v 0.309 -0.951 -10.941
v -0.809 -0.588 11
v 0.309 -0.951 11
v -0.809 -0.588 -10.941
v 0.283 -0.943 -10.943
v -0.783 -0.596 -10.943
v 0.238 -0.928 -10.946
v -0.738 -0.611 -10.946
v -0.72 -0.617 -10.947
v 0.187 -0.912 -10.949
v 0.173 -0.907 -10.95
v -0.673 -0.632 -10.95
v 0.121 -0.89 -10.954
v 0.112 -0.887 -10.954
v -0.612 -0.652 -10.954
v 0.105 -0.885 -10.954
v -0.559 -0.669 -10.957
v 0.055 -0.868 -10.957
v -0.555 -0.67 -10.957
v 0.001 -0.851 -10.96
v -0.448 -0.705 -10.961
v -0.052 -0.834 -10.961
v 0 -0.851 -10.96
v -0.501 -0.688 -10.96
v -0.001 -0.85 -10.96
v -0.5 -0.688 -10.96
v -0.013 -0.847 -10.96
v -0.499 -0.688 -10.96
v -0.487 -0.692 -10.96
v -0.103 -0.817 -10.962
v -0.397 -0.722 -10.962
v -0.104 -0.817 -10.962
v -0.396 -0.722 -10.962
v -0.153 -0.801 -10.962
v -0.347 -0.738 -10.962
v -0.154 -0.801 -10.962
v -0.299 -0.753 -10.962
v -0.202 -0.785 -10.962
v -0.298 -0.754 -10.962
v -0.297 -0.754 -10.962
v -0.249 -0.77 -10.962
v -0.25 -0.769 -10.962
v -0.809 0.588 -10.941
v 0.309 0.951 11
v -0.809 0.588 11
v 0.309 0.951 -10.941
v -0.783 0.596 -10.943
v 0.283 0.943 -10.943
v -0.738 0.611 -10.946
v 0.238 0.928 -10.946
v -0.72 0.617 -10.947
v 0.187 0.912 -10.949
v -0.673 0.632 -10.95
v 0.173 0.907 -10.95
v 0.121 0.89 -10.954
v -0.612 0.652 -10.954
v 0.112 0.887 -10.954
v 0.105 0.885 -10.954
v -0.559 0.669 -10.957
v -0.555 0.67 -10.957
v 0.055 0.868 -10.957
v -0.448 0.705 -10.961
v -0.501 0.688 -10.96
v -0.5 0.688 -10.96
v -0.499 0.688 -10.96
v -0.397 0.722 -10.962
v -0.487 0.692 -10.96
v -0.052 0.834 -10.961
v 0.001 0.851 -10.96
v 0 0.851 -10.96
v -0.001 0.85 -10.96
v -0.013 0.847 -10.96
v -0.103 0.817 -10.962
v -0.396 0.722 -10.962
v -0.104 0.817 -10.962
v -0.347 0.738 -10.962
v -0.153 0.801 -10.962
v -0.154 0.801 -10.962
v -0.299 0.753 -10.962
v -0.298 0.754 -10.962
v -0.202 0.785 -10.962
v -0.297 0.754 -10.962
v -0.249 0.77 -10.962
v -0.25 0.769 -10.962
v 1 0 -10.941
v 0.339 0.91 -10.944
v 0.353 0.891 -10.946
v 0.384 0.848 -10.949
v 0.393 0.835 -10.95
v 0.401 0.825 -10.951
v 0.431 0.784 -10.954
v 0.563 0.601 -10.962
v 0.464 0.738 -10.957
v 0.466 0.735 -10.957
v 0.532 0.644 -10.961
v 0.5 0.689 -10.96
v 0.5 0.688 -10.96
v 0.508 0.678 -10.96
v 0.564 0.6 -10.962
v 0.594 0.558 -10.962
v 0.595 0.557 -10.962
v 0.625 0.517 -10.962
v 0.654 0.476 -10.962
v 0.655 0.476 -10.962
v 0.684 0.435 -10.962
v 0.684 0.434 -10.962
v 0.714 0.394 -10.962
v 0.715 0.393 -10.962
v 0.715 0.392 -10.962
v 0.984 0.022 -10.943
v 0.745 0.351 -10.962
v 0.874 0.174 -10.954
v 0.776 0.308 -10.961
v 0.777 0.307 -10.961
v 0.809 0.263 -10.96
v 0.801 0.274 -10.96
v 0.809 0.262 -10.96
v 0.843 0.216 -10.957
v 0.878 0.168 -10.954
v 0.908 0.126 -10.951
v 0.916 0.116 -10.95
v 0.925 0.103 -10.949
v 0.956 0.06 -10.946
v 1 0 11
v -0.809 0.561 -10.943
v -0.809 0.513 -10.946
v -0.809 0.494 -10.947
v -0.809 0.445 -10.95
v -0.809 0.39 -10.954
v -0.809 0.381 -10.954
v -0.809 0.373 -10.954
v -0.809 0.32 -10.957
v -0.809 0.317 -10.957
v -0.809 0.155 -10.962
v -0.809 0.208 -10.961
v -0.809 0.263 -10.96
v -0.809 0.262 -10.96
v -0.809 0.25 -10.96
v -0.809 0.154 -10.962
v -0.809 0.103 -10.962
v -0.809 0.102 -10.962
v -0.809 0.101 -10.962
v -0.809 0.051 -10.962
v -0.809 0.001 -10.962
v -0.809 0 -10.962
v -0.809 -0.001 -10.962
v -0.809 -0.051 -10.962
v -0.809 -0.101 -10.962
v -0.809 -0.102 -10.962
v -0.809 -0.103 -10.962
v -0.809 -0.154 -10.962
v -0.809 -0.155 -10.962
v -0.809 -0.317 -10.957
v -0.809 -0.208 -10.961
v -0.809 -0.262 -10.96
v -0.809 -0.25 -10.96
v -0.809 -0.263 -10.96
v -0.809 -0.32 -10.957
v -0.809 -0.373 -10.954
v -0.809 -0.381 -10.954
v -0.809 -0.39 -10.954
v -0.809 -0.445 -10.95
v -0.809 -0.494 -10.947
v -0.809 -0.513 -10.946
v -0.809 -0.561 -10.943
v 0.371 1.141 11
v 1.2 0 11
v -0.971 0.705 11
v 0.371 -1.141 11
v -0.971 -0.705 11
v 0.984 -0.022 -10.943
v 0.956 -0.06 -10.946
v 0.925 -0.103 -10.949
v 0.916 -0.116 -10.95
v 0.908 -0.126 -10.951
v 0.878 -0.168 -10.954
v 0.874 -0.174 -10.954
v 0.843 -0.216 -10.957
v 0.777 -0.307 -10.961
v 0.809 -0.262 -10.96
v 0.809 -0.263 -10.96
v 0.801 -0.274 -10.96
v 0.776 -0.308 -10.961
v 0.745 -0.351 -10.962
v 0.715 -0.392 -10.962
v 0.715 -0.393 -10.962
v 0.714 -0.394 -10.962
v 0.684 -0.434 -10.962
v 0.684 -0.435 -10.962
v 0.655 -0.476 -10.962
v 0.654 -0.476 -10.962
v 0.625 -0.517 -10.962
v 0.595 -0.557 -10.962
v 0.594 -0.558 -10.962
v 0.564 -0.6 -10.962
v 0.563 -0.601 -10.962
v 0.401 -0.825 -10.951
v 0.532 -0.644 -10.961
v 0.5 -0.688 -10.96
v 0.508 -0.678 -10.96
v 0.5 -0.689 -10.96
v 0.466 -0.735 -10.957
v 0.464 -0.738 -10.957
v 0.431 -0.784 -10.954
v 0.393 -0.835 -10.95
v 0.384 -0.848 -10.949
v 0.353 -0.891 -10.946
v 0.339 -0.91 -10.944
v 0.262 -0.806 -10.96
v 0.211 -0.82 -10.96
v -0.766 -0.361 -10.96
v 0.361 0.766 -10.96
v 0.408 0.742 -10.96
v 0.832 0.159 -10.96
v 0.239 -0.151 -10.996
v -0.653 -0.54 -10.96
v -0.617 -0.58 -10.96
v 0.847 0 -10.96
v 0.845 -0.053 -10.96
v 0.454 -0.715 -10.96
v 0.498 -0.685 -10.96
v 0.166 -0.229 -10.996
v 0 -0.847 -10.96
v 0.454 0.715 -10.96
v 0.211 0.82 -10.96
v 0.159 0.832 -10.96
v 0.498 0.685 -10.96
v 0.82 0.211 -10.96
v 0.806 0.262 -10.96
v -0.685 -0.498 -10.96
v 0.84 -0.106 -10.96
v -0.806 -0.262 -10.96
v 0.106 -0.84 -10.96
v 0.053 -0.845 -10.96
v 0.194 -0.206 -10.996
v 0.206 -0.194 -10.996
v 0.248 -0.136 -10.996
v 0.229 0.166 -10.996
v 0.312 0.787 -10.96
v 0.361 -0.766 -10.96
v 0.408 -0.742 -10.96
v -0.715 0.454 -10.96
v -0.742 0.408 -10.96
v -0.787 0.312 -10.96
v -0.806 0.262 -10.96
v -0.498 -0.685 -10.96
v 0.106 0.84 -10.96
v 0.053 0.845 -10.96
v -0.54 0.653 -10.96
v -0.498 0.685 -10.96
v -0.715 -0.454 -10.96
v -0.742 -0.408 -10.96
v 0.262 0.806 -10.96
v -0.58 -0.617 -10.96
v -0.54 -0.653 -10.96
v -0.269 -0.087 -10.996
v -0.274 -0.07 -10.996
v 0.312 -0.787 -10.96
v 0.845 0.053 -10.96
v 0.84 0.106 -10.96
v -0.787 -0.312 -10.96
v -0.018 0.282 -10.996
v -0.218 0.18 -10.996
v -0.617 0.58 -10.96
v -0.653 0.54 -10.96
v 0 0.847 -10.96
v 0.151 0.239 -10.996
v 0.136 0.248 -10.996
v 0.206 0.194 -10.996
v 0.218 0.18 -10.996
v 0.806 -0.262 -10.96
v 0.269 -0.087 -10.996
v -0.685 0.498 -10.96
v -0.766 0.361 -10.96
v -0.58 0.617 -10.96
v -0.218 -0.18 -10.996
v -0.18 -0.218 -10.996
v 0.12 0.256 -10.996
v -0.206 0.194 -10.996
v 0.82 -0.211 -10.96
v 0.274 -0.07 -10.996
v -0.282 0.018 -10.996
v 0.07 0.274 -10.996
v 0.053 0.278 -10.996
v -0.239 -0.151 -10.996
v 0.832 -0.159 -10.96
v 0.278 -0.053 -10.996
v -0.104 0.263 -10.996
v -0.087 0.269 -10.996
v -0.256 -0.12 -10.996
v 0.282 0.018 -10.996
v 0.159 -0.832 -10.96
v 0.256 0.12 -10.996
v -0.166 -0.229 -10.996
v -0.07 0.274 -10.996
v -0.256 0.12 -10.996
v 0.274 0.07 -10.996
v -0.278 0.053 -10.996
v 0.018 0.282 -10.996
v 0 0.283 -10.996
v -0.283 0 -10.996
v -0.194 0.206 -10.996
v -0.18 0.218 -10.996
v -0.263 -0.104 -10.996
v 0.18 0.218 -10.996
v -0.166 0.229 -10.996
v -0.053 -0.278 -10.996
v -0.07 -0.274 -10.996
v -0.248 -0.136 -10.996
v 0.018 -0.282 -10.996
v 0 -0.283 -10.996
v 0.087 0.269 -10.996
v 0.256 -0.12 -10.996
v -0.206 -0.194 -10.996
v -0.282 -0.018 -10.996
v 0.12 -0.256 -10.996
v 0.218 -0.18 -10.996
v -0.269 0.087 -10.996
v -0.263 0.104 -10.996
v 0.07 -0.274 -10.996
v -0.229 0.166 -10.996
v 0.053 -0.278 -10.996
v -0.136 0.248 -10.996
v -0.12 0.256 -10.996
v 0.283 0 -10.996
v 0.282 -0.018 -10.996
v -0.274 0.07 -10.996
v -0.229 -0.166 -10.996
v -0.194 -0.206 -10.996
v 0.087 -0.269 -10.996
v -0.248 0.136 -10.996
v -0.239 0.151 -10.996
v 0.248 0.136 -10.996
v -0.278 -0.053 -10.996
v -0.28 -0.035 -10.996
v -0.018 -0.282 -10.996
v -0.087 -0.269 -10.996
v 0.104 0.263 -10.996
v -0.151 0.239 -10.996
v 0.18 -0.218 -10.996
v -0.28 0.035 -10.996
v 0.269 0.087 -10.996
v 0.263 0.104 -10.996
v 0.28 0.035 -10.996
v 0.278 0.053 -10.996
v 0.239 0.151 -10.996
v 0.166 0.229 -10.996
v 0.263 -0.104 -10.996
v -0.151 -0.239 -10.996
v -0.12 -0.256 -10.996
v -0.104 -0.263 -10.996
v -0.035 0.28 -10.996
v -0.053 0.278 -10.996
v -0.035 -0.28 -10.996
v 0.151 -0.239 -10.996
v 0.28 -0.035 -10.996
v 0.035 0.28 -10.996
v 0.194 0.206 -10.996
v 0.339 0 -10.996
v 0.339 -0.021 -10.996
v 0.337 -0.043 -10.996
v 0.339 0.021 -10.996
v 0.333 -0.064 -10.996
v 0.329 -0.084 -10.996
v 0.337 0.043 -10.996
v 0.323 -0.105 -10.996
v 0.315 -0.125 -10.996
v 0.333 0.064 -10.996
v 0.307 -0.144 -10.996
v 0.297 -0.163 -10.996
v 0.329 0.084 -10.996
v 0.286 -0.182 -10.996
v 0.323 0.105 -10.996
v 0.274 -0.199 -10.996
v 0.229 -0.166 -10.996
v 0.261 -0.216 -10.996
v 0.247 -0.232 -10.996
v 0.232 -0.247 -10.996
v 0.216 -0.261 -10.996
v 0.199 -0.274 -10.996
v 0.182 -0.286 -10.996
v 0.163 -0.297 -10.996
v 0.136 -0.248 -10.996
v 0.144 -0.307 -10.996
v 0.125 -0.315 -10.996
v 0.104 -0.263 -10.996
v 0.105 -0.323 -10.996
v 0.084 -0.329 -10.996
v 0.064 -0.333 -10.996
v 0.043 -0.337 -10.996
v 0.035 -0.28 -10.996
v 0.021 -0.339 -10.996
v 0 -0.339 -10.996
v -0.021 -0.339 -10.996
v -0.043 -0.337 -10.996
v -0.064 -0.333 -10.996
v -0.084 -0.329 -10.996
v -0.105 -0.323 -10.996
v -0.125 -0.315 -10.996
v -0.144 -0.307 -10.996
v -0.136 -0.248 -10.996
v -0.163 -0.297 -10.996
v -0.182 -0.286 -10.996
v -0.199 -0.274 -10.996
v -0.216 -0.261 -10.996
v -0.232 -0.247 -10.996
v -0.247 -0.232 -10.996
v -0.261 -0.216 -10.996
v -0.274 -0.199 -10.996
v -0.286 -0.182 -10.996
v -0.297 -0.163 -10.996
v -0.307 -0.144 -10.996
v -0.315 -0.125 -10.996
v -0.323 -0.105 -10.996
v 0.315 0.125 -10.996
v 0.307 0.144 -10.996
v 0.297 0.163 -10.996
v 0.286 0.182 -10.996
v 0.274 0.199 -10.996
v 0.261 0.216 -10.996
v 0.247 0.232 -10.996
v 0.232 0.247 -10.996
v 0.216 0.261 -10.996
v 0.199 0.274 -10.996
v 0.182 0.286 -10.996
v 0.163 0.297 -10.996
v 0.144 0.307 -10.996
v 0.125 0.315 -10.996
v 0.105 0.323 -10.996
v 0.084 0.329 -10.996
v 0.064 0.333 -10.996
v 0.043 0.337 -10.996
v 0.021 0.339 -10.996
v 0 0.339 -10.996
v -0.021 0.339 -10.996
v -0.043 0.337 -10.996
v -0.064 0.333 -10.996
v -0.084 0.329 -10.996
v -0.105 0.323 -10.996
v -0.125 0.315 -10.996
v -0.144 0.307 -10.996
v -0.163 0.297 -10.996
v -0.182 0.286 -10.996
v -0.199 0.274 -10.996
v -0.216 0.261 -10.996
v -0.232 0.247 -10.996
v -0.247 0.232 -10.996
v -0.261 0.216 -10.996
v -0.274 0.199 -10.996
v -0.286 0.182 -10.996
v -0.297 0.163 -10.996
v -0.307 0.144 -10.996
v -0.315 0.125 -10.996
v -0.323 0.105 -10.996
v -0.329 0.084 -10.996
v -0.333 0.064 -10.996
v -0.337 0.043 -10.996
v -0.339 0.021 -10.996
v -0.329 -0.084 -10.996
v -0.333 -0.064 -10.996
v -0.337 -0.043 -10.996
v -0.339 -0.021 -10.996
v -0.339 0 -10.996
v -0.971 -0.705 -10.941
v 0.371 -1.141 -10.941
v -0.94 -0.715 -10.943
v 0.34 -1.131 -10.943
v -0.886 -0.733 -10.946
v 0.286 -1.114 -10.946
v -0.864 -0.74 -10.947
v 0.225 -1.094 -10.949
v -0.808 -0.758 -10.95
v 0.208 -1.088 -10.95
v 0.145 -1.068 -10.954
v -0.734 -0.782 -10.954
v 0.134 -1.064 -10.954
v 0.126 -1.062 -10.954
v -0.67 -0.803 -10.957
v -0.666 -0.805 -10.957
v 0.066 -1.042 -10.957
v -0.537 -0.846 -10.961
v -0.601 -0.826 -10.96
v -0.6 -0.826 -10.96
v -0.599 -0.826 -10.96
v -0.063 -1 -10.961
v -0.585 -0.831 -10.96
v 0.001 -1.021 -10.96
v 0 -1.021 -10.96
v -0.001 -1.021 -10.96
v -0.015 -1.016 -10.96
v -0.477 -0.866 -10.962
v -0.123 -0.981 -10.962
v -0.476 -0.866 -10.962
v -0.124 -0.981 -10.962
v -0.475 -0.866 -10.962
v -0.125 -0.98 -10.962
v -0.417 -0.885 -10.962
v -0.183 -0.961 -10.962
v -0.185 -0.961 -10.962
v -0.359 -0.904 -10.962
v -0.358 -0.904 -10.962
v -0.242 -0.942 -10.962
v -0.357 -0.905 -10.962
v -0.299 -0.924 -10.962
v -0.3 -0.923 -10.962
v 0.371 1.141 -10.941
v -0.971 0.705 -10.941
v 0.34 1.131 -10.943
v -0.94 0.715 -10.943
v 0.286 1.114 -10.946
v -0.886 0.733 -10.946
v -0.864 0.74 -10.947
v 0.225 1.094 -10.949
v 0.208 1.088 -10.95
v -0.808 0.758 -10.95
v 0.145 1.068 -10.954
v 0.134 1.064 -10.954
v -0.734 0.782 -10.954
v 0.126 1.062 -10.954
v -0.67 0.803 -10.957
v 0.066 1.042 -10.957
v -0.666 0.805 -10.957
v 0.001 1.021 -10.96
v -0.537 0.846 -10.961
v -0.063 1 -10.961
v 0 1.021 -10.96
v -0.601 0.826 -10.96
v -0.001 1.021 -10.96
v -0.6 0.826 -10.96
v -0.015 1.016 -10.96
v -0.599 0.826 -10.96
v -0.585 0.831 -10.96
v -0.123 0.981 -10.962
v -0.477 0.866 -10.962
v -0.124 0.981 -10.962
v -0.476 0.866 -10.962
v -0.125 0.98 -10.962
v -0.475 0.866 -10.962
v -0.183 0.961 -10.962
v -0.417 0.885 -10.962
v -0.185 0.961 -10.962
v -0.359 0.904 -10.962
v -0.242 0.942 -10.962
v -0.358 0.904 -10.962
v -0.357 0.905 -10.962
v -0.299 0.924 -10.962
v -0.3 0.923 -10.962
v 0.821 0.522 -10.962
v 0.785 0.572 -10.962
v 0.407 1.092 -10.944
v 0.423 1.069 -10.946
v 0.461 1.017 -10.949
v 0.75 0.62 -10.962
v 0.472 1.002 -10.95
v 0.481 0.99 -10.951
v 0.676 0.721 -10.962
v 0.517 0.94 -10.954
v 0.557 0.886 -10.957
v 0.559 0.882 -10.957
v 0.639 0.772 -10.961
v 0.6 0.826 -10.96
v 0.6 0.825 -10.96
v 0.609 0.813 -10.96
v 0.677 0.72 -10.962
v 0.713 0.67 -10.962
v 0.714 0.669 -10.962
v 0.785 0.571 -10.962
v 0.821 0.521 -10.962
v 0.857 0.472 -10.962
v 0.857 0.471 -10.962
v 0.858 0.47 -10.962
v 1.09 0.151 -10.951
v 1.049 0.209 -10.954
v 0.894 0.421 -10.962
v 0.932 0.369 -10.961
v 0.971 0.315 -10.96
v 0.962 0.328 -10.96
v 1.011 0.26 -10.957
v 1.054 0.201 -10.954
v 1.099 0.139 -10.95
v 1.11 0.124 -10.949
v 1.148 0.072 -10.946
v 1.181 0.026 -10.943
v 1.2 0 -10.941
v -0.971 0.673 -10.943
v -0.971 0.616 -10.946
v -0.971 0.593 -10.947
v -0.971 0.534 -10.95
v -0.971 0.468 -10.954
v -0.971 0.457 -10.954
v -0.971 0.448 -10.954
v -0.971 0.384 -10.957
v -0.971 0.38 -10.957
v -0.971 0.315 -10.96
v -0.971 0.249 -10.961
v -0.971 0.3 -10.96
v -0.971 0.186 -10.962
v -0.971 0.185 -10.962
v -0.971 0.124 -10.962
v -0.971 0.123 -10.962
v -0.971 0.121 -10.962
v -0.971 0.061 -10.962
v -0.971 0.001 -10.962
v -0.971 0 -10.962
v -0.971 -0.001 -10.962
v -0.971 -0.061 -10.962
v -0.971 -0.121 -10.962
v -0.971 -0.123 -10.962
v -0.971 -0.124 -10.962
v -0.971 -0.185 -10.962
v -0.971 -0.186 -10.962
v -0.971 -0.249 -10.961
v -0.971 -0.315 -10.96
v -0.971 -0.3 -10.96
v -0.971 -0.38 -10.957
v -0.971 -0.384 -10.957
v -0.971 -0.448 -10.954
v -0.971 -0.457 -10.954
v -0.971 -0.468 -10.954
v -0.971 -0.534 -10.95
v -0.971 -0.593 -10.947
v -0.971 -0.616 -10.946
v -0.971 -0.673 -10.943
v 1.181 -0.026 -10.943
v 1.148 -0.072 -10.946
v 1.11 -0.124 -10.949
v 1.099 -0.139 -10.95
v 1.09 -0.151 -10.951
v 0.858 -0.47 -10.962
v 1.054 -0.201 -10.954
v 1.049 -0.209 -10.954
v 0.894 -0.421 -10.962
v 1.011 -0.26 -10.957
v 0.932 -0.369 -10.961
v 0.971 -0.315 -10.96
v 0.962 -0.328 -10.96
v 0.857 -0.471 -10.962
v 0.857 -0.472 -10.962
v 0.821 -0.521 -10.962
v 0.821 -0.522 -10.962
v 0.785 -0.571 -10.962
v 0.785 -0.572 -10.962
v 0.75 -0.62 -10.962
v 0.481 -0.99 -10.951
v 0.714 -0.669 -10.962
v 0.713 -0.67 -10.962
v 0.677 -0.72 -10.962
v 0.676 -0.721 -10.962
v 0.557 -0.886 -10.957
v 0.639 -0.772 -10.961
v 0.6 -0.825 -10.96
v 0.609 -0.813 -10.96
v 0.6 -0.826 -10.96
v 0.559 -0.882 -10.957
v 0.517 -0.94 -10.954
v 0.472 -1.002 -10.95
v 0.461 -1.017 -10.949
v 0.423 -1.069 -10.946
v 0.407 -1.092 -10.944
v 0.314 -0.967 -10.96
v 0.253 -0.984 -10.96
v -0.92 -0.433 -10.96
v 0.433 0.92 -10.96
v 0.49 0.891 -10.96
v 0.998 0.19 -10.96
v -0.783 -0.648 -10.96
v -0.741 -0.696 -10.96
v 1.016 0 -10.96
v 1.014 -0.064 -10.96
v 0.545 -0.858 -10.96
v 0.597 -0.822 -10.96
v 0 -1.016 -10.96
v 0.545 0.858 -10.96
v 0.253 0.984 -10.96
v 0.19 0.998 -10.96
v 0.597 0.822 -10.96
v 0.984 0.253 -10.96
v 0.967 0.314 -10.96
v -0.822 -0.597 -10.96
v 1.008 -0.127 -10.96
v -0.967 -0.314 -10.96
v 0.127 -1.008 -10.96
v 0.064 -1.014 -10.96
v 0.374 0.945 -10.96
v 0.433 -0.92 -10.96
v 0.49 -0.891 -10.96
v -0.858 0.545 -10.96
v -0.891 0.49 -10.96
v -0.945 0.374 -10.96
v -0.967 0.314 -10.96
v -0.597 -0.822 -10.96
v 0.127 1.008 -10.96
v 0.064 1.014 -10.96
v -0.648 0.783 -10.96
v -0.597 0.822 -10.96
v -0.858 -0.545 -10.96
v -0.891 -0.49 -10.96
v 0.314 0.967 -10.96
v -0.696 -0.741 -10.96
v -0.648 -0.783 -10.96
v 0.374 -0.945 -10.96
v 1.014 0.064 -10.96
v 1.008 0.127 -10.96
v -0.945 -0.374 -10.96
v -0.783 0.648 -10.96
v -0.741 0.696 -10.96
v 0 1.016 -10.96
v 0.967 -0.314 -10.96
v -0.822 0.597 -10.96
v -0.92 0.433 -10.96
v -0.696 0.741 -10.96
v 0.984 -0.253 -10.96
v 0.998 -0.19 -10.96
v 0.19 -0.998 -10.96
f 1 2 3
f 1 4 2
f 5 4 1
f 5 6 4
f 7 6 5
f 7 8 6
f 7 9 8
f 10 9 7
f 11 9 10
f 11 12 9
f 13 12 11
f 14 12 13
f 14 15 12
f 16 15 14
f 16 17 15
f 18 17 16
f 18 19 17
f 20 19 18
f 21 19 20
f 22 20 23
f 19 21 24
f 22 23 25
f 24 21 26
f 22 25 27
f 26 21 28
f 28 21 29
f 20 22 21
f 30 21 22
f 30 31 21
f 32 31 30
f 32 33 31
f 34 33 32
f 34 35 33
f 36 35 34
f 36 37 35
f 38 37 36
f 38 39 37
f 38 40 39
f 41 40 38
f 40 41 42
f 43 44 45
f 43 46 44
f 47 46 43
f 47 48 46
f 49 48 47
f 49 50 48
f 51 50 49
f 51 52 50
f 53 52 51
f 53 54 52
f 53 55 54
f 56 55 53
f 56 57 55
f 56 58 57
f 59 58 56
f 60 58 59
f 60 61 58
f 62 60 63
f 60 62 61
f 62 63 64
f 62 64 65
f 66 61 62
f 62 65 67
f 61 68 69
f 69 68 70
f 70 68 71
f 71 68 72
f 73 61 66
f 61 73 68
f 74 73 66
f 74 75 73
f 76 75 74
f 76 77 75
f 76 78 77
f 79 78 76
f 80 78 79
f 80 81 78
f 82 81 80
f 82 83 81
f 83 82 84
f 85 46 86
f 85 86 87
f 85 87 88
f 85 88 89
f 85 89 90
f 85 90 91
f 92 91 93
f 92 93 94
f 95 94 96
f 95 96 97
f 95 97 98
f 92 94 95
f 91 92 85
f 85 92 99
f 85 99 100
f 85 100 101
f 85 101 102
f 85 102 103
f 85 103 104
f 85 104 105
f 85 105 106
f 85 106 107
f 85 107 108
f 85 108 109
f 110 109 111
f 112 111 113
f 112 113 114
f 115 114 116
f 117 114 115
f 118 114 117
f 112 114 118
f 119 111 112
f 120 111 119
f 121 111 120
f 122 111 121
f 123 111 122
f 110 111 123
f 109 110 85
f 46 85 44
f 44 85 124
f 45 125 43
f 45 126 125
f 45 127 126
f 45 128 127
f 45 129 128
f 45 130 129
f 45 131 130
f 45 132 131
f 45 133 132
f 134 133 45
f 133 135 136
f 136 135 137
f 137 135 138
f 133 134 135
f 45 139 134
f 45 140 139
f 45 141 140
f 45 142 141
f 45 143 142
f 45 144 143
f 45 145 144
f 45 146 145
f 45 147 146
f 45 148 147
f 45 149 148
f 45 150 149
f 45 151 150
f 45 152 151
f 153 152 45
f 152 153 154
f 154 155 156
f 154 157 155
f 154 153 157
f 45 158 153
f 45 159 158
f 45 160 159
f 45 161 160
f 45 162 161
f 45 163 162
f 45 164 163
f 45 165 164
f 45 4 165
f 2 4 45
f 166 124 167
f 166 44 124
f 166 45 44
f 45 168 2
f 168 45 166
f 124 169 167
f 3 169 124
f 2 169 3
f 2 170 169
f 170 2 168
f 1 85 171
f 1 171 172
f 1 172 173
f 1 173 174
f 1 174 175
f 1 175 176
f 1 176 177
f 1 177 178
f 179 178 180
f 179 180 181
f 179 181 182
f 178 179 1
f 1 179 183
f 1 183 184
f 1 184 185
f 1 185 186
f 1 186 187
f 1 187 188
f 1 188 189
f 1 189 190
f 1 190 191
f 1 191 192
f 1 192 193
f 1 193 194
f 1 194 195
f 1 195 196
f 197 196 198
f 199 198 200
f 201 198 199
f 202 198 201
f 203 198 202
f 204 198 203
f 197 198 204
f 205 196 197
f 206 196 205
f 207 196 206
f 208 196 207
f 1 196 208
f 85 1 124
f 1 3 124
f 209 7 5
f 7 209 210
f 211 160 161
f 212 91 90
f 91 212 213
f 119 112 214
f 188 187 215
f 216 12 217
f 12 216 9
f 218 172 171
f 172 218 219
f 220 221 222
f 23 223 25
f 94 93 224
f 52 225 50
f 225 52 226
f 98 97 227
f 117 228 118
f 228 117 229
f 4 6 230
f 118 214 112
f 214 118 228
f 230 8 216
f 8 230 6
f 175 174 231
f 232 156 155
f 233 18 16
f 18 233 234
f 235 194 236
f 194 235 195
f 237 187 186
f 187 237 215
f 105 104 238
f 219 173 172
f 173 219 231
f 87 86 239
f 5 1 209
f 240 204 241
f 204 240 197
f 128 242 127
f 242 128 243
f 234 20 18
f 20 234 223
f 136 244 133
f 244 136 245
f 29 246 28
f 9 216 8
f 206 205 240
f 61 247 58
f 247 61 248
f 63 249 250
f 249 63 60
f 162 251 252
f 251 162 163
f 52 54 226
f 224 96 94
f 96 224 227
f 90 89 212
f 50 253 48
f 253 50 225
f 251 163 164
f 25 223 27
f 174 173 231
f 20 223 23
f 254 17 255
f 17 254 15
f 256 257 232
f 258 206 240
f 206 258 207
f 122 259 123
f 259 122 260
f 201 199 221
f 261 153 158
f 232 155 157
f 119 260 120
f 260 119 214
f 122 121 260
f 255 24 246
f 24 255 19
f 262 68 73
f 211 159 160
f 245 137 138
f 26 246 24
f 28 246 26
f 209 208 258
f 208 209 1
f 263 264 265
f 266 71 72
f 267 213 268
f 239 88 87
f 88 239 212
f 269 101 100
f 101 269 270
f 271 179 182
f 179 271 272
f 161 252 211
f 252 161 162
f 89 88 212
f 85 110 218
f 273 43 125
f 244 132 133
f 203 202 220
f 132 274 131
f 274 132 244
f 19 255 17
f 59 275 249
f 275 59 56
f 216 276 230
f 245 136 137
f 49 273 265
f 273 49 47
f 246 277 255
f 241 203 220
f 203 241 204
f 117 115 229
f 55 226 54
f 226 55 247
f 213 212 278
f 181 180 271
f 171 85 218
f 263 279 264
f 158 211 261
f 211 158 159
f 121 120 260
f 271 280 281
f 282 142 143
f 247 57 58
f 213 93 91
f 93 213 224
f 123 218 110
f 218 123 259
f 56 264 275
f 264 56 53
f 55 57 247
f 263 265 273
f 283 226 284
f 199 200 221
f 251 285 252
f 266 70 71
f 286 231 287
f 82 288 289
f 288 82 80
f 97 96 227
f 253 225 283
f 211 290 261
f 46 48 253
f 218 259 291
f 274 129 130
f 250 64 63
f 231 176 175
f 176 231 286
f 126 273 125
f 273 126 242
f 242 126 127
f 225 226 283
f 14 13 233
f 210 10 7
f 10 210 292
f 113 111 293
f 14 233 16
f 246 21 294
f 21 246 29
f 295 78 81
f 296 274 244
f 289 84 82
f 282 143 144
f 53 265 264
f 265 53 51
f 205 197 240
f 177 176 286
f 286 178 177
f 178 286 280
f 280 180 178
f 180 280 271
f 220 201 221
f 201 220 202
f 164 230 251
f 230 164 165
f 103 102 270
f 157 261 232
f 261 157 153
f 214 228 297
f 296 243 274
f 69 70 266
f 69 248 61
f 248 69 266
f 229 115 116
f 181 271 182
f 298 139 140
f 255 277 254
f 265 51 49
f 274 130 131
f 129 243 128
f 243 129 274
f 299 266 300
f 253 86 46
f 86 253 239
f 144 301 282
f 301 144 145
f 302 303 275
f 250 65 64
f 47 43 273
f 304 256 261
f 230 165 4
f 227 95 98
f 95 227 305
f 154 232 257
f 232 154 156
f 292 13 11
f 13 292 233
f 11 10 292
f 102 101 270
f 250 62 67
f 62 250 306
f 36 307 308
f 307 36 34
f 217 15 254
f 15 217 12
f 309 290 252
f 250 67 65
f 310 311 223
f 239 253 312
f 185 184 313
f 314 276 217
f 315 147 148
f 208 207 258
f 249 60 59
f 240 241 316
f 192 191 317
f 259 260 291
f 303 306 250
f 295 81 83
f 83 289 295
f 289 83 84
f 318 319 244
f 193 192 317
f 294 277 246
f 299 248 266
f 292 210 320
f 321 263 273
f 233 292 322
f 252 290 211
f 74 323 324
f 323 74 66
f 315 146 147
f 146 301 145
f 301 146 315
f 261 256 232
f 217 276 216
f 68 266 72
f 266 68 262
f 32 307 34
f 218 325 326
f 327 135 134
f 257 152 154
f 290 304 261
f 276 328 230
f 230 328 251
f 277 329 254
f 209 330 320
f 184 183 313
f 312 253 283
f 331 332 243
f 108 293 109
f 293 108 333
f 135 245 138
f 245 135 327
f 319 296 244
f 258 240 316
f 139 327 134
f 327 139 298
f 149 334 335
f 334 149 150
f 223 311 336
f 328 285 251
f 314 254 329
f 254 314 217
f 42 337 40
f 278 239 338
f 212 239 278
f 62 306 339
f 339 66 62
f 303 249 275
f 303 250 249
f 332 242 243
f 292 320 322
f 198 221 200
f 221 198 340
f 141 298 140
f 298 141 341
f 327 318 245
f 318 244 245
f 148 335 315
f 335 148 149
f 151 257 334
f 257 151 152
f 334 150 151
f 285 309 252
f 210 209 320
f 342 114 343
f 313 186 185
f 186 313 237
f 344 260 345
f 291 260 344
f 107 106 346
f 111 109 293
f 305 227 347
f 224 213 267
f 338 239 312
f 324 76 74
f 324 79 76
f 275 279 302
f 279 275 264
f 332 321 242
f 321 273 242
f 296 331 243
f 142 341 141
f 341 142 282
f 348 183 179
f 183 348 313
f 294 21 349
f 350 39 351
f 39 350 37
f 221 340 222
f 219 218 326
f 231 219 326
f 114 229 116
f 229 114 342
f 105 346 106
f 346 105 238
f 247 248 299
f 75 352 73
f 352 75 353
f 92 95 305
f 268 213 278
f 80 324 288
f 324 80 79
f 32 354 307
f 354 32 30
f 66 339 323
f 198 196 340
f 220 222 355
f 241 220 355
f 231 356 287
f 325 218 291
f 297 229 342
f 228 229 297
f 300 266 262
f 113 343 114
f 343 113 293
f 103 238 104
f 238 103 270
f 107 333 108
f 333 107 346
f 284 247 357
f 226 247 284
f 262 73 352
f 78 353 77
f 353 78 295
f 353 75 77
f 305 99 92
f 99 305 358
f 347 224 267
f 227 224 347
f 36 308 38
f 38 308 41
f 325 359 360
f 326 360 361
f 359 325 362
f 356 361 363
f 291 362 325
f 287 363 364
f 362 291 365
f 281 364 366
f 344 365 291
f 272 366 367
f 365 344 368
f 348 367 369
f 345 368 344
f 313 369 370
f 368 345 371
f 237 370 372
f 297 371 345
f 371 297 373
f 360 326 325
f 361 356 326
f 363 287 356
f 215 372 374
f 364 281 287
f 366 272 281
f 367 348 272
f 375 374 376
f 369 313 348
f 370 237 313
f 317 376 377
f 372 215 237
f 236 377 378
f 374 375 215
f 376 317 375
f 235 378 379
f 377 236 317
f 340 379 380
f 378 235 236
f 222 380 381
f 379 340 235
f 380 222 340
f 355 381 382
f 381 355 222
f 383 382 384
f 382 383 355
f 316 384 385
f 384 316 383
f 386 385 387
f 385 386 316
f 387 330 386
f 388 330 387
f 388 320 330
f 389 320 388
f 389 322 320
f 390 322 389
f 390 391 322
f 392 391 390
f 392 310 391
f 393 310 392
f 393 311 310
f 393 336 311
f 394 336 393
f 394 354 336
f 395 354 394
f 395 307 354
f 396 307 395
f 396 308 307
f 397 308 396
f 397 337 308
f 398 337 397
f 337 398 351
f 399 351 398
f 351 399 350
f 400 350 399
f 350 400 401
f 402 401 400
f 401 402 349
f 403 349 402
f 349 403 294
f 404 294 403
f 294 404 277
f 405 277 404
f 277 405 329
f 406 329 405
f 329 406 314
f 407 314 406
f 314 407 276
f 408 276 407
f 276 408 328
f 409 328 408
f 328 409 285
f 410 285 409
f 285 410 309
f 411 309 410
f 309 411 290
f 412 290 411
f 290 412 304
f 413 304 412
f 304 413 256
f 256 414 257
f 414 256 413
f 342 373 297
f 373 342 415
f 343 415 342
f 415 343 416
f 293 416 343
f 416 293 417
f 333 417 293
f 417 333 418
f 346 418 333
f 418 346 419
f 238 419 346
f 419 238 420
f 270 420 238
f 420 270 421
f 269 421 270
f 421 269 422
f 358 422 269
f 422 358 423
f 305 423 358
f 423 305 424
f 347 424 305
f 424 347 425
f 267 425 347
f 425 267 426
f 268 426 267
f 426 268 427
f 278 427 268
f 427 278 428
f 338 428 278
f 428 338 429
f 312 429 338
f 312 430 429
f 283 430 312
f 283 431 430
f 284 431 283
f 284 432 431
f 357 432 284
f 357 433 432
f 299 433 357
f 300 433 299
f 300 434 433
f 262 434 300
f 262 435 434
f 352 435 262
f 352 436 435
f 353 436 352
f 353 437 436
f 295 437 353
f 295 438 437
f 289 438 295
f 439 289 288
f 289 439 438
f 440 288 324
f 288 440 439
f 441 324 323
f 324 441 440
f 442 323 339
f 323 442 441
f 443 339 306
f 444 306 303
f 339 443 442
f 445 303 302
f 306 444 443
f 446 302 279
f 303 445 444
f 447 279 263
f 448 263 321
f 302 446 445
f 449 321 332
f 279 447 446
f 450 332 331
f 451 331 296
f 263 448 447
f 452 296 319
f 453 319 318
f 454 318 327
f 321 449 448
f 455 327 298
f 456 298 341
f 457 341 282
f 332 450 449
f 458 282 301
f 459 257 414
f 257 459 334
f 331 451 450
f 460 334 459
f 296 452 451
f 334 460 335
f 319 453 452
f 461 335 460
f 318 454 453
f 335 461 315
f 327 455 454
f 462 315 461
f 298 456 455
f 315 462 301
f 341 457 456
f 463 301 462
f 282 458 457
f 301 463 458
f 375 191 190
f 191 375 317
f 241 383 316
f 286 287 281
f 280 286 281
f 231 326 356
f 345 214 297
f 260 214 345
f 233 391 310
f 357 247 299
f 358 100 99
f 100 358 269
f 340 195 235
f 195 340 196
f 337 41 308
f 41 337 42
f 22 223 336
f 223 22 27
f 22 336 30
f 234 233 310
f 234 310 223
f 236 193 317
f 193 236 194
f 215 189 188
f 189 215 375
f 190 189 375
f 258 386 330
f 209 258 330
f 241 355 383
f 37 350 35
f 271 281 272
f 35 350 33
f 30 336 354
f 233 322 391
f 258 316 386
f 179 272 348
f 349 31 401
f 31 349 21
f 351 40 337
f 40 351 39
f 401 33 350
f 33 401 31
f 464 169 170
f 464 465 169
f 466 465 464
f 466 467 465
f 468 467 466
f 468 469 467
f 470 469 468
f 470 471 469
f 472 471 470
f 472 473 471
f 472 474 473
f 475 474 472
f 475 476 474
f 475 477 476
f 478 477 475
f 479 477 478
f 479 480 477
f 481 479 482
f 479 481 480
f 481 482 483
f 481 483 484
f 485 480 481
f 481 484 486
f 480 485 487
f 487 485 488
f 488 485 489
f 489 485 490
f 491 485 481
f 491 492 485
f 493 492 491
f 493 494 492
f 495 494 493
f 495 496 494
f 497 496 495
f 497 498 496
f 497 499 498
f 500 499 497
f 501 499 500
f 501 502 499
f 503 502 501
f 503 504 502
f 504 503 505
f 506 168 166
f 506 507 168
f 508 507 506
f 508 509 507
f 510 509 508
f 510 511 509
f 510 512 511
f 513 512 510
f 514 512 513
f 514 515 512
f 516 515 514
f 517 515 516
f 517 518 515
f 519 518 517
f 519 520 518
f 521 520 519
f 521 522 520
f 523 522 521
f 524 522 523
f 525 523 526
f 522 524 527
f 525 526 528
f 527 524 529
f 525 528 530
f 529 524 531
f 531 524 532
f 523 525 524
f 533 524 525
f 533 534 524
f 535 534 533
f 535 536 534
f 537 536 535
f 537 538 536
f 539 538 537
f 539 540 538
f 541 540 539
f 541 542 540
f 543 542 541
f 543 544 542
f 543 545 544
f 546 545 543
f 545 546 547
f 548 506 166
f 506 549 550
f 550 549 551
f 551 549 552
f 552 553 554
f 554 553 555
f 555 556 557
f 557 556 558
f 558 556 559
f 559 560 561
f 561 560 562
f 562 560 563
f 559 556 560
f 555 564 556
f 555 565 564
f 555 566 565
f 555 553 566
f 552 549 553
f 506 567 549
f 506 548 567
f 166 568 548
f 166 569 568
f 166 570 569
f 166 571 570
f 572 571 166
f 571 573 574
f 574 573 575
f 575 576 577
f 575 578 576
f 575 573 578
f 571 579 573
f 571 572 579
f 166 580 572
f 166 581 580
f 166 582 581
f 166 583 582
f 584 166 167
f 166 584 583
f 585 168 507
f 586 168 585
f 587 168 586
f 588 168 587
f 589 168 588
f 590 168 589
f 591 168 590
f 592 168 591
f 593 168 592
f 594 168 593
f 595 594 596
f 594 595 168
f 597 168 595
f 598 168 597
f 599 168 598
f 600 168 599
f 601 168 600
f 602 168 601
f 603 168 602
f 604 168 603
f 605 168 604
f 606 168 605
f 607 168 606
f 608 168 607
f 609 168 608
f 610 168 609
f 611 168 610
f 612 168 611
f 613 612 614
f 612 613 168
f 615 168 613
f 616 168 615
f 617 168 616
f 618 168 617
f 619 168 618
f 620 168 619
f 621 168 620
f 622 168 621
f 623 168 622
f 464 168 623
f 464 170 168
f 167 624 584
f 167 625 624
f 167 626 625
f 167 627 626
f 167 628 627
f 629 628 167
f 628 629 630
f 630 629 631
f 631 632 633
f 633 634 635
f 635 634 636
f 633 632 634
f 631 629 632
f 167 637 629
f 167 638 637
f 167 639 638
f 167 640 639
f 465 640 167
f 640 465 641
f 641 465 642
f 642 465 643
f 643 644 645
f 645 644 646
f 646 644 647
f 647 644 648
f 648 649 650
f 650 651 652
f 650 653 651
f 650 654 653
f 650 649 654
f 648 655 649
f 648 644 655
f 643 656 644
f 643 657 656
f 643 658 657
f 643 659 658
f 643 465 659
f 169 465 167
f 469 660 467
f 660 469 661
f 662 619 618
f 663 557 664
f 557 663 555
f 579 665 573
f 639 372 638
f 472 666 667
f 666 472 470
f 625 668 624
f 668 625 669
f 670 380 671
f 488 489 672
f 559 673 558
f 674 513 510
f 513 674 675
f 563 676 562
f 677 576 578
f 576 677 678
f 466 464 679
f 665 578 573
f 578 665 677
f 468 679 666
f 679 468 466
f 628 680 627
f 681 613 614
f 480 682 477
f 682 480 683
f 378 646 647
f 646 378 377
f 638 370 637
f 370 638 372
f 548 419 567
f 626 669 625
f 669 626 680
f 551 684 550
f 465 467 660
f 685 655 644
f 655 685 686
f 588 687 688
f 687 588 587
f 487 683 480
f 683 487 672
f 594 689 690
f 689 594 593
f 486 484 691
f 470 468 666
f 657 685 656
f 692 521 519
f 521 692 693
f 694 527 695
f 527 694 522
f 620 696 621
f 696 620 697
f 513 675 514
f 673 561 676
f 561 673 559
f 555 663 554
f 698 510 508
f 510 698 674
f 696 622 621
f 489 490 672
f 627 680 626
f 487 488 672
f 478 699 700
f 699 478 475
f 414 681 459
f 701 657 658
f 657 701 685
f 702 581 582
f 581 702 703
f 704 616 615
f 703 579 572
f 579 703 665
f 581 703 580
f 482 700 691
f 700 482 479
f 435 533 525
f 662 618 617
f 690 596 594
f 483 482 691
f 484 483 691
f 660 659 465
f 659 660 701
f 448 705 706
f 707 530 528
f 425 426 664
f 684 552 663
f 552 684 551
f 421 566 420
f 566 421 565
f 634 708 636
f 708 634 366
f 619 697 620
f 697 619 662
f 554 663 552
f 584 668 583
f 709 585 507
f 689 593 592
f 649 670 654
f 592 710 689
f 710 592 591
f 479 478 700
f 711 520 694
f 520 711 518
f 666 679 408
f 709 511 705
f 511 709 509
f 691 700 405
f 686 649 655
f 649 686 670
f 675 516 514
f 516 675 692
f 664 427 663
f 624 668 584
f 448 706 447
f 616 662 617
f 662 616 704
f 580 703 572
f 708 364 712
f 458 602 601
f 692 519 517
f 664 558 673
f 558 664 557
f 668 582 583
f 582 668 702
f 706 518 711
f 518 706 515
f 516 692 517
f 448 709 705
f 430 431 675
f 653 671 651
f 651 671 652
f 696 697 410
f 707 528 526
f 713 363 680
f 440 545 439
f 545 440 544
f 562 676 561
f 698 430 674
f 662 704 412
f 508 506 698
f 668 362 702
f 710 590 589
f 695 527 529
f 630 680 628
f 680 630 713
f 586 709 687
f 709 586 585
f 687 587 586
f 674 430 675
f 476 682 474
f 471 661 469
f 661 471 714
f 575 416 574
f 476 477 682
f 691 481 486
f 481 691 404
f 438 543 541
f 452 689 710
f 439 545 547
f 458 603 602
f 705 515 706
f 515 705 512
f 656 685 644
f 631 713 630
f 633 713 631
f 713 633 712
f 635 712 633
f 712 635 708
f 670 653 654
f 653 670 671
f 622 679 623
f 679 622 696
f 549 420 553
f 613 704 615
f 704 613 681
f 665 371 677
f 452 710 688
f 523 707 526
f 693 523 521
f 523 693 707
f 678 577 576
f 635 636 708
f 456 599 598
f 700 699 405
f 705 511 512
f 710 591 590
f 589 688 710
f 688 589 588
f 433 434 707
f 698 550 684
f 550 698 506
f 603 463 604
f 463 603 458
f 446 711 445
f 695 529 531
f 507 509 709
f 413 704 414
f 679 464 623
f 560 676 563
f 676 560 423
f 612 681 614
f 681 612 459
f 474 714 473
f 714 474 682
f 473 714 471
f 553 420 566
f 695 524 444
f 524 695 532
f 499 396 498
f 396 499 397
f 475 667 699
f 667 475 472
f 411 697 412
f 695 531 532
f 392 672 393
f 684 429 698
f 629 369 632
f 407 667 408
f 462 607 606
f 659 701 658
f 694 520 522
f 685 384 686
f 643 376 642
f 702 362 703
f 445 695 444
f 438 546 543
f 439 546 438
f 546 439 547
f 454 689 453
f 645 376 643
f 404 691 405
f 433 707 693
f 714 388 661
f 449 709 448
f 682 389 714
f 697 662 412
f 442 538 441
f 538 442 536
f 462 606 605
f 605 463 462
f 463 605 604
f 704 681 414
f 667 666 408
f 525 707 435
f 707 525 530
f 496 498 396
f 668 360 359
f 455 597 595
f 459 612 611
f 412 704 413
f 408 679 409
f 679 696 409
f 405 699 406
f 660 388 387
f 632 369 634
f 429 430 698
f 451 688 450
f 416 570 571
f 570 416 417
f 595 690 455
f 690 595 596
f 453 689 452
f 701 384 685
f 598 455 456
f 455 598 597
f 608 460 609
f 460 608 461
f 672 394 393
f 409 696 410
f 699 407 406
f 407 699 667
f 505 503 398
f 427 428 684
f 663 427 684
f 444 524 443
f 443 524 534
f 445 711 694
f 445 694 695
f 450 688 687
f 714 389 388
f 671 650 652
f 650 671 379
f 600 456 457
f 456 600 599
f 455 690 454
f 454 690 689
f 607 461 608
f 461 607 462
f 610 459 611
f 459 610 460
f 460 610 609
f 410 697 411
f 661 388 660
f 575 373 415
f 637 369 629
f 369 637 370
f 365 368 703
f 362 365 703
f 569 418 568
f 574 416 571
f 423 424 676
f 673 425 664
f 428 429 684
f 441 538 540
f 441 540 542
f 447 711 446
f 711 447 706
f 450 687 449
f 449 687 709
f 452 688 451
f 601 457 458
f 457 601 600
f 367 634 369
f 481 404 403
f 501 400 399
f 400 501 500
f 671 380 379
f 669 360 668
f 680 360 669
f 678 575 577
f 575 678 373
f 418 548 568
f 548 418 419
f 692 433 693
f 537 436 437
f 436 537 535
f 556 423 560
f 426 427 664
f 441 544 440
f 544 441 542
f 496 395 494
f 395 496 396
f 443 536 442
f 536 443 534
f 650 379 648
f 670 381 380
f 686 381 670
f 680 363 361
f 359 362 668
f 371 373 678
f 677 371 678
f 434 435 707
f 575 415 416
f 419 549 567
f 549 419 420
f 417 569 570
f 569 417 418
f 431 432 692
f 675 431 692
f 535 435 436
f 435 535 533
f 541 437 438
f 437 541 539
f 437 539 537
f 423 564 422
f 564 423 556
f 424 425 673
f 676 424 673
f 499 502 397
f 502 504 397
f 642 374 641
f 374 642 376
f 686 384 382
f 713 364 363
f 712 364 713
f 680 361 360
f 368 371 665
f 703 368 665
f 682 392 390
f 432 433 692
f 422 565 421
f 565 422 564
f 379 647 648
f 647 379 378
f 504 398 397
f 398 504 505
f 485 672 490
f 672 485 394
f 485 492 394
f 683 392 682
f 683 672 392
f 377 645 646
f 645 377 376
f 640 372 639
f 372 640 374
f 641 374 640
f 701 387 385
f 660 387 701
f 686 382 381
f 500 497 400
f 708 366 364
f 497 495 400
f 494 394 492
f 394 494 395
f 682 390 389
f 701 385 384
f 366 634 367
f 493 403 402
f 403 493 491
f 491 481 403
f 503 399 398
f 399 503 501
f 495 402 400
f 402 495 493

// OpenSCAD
//Variabels
res=100;
//Modules
module cut() {
	hull() {	cylinder(r=9,h=15,center=true,$fn=res);
	translate([0,0,-10])sphere(9,$fn=res);}
}
module body() {
intersection() {
	cylinder(22,center=true);
	translate([0,0,8])cut();}
}

//Render
difference() {
	scale(v=[1.2,1.2,1])body();
	body();
}
